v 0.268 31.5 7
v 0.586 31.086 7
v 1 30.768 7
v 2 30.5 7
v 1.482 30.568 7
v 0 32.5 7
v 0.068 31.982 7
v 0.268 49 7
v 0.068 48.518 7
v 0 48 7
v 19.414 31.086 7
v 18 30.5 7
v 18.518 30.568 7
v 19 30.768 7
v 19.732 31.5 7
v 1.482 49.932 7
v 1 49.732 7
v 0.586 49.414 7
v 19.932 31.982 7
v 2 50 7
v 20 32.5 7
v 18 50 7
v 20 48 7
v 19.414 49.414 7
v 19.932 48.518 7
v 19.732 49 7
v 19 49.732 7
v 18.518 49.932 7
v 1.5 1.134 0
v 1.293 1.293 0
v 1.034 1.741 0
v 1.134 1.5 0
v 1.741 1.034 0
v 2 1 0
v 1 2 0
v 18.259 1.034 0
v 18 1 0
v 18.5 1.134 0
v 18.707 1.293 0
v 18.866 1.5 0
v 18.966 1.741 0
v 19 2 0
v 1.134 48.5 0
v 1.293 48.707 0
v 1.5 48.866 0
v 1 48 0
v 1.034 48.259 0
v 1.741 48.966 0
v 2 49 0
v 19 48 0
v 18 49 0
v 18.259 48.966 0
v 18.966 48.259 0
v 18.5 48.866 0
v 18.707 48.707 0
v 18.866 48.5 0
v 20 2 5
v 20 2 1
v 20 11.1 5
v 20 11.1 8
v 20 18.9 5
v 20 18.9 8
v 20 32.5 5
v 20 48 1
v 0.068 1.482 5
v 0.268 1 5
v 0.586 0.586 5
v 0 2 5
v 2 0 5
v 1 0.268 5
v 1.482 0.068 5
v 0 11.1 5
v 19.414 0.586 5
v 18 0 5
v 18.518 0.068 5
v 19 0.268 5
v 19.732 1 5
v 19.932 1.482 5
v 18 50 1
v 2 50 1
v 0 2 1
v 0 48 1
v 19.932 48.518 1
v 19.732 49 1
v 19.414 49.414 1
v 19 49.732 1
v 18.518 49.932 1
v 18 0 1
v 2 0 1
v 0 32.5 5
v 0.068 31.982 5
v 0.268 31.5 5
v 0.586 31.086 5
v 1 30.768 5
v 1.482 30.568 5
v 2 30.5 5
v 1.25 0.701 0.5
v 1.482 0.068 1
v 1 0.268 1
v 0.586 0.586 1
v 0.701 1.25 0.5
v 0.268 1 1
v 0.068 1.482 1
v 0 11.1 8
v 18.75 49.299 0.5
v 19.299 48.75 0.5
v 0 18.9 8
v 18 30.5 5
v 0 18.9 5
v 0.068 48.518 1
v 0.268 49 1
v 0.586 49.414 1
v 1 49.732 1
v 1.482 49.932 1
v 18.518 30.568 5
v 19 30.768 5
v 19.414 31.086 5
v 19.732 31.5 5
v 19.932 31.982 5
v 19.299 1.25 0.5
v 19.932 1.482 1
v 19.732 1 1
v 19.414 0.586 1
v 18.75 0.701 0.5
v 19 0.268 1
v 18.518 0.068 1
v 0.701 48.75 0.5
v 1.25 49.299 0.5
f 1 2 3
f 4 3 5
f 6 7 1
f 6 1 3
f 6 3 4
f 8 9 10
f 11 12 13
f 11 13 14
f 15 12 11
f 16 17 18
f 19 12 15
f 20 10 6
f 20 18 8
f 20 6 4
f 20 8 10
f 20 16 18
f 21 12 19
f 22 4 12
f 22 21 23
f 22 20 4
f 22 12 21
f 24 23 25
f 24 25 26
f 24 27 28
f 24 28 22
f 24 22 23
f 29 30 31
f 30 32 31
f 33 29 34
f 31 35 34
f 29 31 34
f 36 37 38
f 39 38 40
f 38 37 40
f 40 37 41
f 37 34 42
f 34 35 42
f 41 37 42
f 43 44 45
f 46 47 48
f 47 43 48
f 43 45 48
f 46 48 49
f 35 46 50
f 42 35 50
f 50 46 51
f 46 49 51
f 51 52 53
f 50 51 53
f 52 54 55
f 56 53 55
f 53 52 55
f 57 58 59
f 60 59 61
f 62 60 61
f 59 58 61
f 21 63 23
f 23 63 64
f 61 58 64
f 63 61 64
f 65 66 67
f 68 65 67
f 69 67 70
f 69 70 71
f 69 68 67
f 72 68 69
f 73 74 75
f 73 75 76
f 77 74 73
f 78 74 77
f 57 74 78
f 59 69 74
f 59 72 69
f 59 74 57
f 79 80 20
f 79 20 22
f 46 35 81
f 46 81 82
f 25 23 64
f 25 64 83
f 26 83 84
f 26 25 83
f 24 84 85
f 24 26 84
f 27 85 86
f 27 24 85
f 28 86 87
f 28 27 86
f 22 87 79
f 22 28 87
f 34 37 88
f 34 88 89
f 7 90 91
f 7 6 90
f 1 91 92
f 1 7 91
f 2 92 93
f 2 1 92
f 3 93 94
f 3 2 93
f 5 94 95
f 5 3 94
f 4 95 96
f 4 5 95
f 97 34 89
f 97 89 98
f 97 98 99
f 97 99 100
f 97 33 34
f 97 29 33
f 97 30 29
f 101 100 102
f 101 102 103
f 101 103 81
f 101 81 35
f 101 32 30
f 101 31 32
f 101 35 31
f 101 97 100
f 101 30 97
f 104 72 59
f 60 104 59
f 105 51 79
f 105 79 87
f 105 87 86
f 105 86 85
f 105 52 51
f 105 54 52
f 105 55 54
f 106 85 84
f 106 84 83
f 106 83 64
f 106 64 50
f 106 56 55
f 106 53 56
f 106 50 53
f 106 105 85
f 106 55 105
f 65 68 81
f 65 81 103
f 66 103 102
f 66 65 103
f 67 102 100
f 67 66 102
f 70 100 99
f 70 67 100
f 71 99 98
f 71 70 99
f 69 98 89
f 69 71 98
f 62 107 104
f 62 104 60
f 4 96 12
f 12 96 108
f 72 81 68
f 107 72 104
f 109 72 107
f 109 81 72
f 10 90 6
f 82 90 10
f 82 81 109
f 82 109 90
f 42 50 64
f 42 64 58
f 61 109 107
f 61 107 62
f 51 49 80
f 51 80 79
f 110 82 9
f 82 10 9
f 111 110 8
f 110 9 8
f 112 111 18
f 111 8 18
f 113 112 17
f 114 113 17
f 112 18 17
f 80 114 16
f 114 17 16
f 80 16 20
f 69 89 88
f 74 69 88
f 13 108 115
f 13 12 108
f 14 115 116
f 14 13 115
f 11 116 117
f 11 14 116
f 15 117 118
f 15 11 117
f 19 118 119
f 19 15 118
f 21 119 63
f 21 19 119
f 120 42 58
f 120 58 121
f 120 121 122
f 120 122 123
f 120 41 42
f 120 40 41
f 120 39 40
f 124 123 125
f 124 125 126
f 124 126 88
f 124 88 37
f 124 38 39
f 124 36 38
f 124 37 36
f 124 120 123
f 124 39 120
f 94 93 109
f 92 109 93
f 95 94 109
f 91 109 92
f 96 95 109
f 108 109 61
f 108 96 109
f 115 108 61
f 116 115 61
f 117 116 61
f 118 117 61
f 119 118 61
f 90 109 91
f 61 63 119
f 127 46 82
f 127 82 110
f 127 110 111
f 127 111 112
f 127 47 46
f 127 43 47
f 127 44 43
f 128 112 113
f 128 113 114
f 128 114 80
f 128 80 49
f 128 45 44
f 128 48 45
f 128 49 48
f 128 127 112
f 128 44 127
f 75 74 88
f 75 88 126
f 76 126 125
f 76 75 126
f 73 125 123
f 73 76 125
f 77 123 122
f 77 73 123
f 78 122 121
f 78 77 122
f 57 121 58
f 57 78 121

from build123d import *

# Parameters (mm, degrees)
BOX_W        = 20
BOX_H        = 50
BOX_DEPTH    = 5
FILLET_R     = 2
CHAMFER_SIZE = 1
BOX001_W     = 20
BOX001_H     = 7.8
BOX001_DEPTH = 3
BOX002_W     = 20
BOX002_H     = 19.5
BOX002_DEPTH = 2
FILLET001_R  = 2


with BuildPart() as chamfer_body:
    # Box → Box (new body)
    with BuildSketch(Plane.XY):
        with Locations((10, 25)):
            Rectangle(BOX_W, BOX_H)
    extrude(amount=BOX_DEPTH)

    # Fillet
    fillet_edges = [chamfer_body.edges().sort_by_distance(p)[0] for p in [
        (0, 0, 2.5),
        (0, 50, 2.5),
        (20, 0, 2.5),
        (20, 50, 2.5),
    ]]
    fillet(fillet_edges, radius=FILLET_R)

    # Chamfer
    chamfer_edges = [chamfer_body.edges().sort_by_distance(p)[0] for p in [
        (0, 25, 0),
        (0.585786, 0.585786, 0),
        (0.585786, 49.414214, 0),
        (10, 0, 0),
        (19.414214, 0.585786, 0),
        (20, 25, 0),
        (19.414214, 49.414214, 0),
        (10, 50, 0),
    ]]
    chamfer(chamfer_edges, length=CHAMFER_SIZE)


with BuildPart() as cube001:
    # Box001 → Box001 (new body)
    with BuildSketch(Plane(origin=(0, 11.1, 5), x_dir=(1, 0, 0), z_dir=(0, 0, 1))):
        with Locations((10, 3.9)):
            Rectangle(BOX001_W, BOX001_H)
    extrude(amount=BOX001_DEPTH)


with BuildPart() as fusion:
    # Box002 → Box002 (new body)
    with BuildSketch(Plane(origin=(0, 30.5, 5), x_dir=(1, 0, 0), z_dir=(0, 0, 1))):
        with Locations((10, 9.75)):
            Rectangle(BOX002_W, BOX002_H)
    extrude(amount=BOX002_DEPTH)

    # Fillet001
    fillet001_edges = [fusion.edges().sort_by_distance(p)[0] for p in [
        (0, 30.5, 6),
        (0, 50, 6),
        (20, 30.5, 6),
        (20, 50, 6),
    ]]
    fillet(fillet001_edges, radius=FILLET001_R)

    # Fusion: union Chamfer body, Cube001
    add(chamfer_body.part)
    add(cube001.part)


solid = fusion.part
